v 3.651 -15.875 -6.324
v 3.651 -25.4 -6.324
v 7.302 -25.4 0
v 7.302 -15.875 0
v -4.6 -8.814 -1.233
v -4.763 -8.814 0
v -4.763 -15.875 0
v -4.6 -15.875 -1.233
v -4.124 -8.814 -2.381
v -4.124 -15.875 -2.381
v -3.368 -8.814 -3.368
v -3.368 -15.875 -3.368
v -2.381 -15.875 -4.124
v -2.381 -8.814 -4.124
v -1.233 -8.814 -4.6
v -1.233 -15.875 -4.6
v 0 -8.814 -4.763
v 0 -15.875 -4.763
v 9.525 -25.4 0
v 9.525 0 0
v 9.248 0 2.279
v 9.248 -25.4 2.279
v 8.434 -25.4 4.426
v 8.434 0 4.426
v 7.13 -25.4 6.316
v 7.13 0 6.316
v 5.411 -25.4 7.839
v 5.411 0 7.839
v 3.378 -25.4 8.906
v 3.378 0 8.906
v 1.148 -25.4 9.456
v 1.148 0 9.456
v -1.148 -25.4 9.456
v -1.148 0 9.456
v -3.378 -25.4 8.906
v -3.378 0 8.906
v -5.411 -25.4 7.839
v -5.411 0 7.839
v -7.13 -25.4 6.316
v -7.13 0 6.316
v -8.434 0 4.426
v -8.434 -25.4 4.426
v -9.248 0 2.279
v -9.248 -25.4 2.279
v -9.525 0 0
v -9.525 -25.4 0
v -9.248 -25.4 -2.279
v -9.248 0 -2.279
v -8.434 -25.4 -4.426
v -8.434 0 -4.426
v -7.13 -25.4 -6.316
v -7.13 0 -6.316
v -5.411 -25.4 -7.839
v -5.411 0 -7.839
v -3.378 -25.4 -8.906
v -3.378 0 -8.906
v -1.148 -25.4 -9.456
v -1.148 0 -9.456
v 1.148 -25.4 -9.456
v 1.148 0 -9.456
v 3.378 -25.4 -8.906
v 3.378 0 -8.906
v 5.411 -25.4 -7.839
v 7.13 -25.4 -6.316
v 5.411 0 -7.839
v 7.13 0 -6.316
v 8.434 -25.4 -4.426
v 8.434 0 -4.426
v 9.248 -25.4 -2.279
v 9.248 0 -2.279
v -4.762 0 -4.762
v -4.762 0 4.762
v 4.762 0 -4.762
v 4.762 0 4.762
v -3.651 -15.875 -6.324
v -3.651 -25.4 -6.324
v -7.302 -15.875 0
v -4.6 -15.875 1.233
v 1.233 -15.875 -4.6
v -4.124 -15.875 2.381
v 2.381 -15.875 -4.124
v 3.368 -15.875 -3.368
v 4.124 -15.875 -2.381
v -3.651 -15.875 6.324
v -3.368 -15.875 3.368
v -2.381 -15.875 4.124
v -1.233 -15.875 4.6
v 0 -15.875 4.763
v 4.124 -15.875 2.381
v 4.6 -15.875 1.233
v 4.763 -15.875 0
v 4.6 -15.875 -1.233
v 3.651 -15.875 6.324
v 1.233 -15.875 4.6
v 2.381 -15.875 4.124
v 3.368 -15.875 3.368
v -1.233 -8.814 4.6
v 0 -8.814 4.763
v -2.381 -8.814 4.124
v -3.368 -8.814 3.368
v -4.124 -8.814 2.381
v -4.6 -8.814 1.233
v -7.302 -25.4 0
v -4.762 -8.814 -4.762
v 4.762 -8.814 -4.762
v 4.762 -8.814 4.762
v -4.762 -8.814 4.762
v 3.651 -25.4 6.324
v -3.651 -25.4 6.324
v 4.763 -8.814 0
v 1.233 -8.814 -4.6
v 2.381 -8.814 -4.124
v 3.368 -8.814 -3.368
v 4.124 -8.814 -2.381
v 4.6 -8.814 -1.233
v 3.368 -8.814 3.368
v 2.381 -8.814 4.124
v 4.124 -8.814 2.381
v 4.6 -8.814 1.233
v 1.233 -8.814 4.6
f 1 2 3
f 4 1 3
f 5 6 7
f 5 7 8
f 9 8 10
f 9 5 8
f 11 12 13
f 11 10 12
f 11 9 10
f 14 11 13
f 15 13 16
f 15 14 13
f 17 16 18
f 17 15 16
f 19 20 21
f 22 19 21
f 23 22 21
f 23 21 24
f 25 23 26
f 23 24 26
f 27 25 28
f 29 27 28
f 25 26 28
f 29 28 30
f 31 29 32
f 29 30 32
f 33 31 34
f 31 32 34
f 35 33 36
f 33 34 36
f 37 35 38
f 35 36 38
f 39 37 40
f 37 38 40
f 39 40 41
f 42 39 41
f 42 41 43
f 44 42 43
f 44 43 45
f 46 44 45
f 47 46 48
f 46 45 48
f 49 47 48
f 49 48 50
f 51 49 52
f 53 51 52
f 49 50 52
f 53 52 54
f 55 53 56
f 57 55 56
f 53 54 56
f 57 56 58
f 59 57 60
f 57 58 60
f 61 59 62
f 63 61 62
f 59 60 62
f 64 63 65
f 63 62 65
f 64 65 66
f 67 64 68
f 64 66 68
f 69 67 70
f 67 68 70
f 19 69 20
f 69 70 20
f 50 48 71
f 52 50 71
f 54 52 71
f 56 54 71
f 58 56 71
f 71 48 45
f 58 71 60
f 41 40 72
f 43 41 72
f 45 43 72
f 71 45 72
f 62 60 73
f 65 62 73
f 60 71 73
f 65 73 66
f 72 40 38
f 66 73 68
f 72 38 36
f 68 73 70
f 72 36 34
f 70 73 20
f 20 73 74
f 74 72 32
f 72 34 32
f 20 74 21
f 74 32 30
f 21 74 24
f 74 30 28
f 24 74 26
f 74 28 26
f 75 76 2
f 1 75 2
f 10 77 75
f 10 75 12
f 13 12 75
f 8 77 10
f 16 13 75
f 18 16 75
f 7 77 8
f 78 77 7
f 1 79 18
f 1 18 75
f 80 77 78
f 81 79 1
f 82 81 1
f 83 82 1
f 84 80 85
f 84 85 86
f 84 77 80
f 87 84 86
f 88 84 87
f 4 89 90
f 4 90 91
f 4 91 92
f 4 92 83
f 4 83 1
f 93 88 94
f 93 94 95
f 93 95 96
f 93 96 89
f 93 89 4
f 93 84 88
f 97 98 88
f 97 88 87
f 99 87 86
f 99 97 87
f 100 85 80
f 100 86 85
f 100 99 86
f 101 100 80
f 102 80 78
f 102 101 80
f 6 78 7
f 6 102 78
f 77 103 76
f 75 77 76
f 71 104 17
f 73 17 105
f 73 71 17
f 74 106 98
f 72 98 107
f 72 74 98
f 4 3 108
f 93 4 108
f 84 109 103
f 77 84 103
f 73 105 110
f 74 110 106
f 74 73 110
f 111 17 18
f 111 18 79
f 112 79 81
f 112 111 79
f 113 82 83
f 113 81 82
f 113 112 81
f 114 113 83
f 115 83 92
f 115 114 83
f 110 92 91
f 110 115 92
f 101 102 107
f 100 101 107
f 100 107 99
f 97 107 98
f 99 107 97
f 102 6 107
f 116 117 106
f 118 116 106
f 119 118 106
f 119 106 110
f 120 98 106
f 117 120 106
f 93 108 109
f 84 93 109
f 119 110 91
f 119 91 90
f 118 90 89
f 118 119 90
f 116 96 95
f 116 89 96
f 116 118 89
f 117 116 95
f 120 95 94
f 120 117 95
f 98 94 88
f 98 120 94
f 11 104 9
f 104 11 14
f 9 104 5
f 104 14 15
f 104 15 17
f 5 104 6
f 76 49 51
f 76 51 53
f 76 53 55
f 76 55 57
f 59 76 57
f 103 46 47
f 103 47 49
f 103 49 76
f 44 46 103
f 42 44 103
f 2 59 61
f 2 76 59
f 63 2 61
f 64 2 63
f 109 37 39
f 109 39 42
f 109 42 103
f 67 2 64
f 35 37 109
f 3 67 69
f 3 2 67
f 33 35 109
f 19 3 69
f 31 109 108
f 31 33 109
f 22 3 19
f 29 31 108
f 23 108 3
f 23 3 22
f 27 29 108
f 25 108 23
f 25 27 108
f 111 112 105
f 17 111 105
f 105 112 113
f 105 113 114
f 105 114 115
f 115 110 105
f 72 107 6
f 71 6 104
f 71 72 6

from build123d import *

# Parameters (mm, degrees)
F0_R        = 9.525
F1_DEPTH    = 25.4
F3_DEPTH    = 25.4
F1_FACE_R   = 9.525
F1_FACE_R_2 = 4.7625
F4_DEPTH    = 8.8138
F6_DEPTH    = 9.525


with BuildPart() as f1:
    # F0 (on Front) → F1 (new body)
    with BuildSketch(Plane.XZ):
        Circle(F0_R)
    extrude(amount=F1_DEPTH)

    # F2 (on Front) → F3 (cut)
    with BuildSketch(Plane.XZ):
        with BuildLine():
            ThreePointArc((4.7625, 0), (3.3675960454, 3.3675960454), (0, 4.7625))
            ThreePointArc((0, 4.7625), (-3.3675960454, 3.3675960454), (-4.7625, 0))
            ThreePointArc((-4.7625, 0), (-3.3675960454, -3.3675960454), (0, -4.7625))
            ThreePointArc((0, -4.7625), (3.3675960454, -3.3675960454), (4.7625, 0))
        make_face()
    extrude(amount=F3_DEPTH, mode=Mode.SUBTRACT)

    # F2 (on Front) + F1_face (on face) → F4 (cut)
    with BuildSketch(Plane.XZ):
        with BuildLine():
            Line((4.7625, 0), (4.7625, 4.7625))
            Line((4.7625, 4.7625), (0, 4.7625))
            ThreePointArc((0, 4.7625), (3.3675960454, 3.3675960454), (4.7625, 0))
        make_face()
        with BuildLine():
            ThreePointArc((-4.7625, 0), (-3.3675960454, 3.3675960454), (0, 4.7625))
            Line((0, 4.7625), (-4.7625, 4.7625))
            Line((-4.7625, 4.7625), (-4.7625, 0))
        make_face()
        with BuildLine():
            ThreePointArc((4.7625, 0), (3.3675960454, 3.3675960454), (0, 4.7625))
            ThreePointArc((0, 4.7625), (-3.3675960454, 3.3675960454), (-4.7625, 0))
            ThreePointArc((-4.7625, 0), (-3.3675960454, -3.3675960454), (0, -4.7625))
            ThreePointArc((0, -4.7625), (3.3675960454, -3.3675960454), (4.7625, 0))
        make_face()
        with BuildLine():
            Line((4.7625, -4.7625), (4.7625, 0))
            ThreePointArc((4.7625, 0), (3.3675960454, -3.3675960454), (0, -4.7625))
            Line((0, -4.7625), (4.7625, -4.7625))
        make_face()
        with BuildLine():
            ThreePointArc((0, -4.7625), (-3.3675960454, -3.3675960454), (-4.7625, 0))
            Line((-4.7625, 0), (-4.7625, -4.7625))
            Line((-4.7625, -4.7625), (0, -4.7625))
        make_face()
    with BuildSketch(Plane.XZ.offset(25.4)):
        Circle(F1_FACE_R)
        Circle(F1_FACE_R_2, mode=Mode.SUBTRACT)
    extrude(amount=F4_DEPTH, mode=Mode.SUBTRACT)

    # F5 (on face) → F6 (cut)
    with BuildSketch(Plane.XZ.offset(25.4)):
        Polygon((-3.65125, -6.3241505111), (3.65125, -6.3241505111), (7.3025, 0), (3.65125, 6.3241505111), (-3.65125, 6.3241505111), (-7.3025, 0), align=None)
    extrude(amount=-F6_DEPTH, mode=Mode.SUBTRACT)


solid = f1.part
